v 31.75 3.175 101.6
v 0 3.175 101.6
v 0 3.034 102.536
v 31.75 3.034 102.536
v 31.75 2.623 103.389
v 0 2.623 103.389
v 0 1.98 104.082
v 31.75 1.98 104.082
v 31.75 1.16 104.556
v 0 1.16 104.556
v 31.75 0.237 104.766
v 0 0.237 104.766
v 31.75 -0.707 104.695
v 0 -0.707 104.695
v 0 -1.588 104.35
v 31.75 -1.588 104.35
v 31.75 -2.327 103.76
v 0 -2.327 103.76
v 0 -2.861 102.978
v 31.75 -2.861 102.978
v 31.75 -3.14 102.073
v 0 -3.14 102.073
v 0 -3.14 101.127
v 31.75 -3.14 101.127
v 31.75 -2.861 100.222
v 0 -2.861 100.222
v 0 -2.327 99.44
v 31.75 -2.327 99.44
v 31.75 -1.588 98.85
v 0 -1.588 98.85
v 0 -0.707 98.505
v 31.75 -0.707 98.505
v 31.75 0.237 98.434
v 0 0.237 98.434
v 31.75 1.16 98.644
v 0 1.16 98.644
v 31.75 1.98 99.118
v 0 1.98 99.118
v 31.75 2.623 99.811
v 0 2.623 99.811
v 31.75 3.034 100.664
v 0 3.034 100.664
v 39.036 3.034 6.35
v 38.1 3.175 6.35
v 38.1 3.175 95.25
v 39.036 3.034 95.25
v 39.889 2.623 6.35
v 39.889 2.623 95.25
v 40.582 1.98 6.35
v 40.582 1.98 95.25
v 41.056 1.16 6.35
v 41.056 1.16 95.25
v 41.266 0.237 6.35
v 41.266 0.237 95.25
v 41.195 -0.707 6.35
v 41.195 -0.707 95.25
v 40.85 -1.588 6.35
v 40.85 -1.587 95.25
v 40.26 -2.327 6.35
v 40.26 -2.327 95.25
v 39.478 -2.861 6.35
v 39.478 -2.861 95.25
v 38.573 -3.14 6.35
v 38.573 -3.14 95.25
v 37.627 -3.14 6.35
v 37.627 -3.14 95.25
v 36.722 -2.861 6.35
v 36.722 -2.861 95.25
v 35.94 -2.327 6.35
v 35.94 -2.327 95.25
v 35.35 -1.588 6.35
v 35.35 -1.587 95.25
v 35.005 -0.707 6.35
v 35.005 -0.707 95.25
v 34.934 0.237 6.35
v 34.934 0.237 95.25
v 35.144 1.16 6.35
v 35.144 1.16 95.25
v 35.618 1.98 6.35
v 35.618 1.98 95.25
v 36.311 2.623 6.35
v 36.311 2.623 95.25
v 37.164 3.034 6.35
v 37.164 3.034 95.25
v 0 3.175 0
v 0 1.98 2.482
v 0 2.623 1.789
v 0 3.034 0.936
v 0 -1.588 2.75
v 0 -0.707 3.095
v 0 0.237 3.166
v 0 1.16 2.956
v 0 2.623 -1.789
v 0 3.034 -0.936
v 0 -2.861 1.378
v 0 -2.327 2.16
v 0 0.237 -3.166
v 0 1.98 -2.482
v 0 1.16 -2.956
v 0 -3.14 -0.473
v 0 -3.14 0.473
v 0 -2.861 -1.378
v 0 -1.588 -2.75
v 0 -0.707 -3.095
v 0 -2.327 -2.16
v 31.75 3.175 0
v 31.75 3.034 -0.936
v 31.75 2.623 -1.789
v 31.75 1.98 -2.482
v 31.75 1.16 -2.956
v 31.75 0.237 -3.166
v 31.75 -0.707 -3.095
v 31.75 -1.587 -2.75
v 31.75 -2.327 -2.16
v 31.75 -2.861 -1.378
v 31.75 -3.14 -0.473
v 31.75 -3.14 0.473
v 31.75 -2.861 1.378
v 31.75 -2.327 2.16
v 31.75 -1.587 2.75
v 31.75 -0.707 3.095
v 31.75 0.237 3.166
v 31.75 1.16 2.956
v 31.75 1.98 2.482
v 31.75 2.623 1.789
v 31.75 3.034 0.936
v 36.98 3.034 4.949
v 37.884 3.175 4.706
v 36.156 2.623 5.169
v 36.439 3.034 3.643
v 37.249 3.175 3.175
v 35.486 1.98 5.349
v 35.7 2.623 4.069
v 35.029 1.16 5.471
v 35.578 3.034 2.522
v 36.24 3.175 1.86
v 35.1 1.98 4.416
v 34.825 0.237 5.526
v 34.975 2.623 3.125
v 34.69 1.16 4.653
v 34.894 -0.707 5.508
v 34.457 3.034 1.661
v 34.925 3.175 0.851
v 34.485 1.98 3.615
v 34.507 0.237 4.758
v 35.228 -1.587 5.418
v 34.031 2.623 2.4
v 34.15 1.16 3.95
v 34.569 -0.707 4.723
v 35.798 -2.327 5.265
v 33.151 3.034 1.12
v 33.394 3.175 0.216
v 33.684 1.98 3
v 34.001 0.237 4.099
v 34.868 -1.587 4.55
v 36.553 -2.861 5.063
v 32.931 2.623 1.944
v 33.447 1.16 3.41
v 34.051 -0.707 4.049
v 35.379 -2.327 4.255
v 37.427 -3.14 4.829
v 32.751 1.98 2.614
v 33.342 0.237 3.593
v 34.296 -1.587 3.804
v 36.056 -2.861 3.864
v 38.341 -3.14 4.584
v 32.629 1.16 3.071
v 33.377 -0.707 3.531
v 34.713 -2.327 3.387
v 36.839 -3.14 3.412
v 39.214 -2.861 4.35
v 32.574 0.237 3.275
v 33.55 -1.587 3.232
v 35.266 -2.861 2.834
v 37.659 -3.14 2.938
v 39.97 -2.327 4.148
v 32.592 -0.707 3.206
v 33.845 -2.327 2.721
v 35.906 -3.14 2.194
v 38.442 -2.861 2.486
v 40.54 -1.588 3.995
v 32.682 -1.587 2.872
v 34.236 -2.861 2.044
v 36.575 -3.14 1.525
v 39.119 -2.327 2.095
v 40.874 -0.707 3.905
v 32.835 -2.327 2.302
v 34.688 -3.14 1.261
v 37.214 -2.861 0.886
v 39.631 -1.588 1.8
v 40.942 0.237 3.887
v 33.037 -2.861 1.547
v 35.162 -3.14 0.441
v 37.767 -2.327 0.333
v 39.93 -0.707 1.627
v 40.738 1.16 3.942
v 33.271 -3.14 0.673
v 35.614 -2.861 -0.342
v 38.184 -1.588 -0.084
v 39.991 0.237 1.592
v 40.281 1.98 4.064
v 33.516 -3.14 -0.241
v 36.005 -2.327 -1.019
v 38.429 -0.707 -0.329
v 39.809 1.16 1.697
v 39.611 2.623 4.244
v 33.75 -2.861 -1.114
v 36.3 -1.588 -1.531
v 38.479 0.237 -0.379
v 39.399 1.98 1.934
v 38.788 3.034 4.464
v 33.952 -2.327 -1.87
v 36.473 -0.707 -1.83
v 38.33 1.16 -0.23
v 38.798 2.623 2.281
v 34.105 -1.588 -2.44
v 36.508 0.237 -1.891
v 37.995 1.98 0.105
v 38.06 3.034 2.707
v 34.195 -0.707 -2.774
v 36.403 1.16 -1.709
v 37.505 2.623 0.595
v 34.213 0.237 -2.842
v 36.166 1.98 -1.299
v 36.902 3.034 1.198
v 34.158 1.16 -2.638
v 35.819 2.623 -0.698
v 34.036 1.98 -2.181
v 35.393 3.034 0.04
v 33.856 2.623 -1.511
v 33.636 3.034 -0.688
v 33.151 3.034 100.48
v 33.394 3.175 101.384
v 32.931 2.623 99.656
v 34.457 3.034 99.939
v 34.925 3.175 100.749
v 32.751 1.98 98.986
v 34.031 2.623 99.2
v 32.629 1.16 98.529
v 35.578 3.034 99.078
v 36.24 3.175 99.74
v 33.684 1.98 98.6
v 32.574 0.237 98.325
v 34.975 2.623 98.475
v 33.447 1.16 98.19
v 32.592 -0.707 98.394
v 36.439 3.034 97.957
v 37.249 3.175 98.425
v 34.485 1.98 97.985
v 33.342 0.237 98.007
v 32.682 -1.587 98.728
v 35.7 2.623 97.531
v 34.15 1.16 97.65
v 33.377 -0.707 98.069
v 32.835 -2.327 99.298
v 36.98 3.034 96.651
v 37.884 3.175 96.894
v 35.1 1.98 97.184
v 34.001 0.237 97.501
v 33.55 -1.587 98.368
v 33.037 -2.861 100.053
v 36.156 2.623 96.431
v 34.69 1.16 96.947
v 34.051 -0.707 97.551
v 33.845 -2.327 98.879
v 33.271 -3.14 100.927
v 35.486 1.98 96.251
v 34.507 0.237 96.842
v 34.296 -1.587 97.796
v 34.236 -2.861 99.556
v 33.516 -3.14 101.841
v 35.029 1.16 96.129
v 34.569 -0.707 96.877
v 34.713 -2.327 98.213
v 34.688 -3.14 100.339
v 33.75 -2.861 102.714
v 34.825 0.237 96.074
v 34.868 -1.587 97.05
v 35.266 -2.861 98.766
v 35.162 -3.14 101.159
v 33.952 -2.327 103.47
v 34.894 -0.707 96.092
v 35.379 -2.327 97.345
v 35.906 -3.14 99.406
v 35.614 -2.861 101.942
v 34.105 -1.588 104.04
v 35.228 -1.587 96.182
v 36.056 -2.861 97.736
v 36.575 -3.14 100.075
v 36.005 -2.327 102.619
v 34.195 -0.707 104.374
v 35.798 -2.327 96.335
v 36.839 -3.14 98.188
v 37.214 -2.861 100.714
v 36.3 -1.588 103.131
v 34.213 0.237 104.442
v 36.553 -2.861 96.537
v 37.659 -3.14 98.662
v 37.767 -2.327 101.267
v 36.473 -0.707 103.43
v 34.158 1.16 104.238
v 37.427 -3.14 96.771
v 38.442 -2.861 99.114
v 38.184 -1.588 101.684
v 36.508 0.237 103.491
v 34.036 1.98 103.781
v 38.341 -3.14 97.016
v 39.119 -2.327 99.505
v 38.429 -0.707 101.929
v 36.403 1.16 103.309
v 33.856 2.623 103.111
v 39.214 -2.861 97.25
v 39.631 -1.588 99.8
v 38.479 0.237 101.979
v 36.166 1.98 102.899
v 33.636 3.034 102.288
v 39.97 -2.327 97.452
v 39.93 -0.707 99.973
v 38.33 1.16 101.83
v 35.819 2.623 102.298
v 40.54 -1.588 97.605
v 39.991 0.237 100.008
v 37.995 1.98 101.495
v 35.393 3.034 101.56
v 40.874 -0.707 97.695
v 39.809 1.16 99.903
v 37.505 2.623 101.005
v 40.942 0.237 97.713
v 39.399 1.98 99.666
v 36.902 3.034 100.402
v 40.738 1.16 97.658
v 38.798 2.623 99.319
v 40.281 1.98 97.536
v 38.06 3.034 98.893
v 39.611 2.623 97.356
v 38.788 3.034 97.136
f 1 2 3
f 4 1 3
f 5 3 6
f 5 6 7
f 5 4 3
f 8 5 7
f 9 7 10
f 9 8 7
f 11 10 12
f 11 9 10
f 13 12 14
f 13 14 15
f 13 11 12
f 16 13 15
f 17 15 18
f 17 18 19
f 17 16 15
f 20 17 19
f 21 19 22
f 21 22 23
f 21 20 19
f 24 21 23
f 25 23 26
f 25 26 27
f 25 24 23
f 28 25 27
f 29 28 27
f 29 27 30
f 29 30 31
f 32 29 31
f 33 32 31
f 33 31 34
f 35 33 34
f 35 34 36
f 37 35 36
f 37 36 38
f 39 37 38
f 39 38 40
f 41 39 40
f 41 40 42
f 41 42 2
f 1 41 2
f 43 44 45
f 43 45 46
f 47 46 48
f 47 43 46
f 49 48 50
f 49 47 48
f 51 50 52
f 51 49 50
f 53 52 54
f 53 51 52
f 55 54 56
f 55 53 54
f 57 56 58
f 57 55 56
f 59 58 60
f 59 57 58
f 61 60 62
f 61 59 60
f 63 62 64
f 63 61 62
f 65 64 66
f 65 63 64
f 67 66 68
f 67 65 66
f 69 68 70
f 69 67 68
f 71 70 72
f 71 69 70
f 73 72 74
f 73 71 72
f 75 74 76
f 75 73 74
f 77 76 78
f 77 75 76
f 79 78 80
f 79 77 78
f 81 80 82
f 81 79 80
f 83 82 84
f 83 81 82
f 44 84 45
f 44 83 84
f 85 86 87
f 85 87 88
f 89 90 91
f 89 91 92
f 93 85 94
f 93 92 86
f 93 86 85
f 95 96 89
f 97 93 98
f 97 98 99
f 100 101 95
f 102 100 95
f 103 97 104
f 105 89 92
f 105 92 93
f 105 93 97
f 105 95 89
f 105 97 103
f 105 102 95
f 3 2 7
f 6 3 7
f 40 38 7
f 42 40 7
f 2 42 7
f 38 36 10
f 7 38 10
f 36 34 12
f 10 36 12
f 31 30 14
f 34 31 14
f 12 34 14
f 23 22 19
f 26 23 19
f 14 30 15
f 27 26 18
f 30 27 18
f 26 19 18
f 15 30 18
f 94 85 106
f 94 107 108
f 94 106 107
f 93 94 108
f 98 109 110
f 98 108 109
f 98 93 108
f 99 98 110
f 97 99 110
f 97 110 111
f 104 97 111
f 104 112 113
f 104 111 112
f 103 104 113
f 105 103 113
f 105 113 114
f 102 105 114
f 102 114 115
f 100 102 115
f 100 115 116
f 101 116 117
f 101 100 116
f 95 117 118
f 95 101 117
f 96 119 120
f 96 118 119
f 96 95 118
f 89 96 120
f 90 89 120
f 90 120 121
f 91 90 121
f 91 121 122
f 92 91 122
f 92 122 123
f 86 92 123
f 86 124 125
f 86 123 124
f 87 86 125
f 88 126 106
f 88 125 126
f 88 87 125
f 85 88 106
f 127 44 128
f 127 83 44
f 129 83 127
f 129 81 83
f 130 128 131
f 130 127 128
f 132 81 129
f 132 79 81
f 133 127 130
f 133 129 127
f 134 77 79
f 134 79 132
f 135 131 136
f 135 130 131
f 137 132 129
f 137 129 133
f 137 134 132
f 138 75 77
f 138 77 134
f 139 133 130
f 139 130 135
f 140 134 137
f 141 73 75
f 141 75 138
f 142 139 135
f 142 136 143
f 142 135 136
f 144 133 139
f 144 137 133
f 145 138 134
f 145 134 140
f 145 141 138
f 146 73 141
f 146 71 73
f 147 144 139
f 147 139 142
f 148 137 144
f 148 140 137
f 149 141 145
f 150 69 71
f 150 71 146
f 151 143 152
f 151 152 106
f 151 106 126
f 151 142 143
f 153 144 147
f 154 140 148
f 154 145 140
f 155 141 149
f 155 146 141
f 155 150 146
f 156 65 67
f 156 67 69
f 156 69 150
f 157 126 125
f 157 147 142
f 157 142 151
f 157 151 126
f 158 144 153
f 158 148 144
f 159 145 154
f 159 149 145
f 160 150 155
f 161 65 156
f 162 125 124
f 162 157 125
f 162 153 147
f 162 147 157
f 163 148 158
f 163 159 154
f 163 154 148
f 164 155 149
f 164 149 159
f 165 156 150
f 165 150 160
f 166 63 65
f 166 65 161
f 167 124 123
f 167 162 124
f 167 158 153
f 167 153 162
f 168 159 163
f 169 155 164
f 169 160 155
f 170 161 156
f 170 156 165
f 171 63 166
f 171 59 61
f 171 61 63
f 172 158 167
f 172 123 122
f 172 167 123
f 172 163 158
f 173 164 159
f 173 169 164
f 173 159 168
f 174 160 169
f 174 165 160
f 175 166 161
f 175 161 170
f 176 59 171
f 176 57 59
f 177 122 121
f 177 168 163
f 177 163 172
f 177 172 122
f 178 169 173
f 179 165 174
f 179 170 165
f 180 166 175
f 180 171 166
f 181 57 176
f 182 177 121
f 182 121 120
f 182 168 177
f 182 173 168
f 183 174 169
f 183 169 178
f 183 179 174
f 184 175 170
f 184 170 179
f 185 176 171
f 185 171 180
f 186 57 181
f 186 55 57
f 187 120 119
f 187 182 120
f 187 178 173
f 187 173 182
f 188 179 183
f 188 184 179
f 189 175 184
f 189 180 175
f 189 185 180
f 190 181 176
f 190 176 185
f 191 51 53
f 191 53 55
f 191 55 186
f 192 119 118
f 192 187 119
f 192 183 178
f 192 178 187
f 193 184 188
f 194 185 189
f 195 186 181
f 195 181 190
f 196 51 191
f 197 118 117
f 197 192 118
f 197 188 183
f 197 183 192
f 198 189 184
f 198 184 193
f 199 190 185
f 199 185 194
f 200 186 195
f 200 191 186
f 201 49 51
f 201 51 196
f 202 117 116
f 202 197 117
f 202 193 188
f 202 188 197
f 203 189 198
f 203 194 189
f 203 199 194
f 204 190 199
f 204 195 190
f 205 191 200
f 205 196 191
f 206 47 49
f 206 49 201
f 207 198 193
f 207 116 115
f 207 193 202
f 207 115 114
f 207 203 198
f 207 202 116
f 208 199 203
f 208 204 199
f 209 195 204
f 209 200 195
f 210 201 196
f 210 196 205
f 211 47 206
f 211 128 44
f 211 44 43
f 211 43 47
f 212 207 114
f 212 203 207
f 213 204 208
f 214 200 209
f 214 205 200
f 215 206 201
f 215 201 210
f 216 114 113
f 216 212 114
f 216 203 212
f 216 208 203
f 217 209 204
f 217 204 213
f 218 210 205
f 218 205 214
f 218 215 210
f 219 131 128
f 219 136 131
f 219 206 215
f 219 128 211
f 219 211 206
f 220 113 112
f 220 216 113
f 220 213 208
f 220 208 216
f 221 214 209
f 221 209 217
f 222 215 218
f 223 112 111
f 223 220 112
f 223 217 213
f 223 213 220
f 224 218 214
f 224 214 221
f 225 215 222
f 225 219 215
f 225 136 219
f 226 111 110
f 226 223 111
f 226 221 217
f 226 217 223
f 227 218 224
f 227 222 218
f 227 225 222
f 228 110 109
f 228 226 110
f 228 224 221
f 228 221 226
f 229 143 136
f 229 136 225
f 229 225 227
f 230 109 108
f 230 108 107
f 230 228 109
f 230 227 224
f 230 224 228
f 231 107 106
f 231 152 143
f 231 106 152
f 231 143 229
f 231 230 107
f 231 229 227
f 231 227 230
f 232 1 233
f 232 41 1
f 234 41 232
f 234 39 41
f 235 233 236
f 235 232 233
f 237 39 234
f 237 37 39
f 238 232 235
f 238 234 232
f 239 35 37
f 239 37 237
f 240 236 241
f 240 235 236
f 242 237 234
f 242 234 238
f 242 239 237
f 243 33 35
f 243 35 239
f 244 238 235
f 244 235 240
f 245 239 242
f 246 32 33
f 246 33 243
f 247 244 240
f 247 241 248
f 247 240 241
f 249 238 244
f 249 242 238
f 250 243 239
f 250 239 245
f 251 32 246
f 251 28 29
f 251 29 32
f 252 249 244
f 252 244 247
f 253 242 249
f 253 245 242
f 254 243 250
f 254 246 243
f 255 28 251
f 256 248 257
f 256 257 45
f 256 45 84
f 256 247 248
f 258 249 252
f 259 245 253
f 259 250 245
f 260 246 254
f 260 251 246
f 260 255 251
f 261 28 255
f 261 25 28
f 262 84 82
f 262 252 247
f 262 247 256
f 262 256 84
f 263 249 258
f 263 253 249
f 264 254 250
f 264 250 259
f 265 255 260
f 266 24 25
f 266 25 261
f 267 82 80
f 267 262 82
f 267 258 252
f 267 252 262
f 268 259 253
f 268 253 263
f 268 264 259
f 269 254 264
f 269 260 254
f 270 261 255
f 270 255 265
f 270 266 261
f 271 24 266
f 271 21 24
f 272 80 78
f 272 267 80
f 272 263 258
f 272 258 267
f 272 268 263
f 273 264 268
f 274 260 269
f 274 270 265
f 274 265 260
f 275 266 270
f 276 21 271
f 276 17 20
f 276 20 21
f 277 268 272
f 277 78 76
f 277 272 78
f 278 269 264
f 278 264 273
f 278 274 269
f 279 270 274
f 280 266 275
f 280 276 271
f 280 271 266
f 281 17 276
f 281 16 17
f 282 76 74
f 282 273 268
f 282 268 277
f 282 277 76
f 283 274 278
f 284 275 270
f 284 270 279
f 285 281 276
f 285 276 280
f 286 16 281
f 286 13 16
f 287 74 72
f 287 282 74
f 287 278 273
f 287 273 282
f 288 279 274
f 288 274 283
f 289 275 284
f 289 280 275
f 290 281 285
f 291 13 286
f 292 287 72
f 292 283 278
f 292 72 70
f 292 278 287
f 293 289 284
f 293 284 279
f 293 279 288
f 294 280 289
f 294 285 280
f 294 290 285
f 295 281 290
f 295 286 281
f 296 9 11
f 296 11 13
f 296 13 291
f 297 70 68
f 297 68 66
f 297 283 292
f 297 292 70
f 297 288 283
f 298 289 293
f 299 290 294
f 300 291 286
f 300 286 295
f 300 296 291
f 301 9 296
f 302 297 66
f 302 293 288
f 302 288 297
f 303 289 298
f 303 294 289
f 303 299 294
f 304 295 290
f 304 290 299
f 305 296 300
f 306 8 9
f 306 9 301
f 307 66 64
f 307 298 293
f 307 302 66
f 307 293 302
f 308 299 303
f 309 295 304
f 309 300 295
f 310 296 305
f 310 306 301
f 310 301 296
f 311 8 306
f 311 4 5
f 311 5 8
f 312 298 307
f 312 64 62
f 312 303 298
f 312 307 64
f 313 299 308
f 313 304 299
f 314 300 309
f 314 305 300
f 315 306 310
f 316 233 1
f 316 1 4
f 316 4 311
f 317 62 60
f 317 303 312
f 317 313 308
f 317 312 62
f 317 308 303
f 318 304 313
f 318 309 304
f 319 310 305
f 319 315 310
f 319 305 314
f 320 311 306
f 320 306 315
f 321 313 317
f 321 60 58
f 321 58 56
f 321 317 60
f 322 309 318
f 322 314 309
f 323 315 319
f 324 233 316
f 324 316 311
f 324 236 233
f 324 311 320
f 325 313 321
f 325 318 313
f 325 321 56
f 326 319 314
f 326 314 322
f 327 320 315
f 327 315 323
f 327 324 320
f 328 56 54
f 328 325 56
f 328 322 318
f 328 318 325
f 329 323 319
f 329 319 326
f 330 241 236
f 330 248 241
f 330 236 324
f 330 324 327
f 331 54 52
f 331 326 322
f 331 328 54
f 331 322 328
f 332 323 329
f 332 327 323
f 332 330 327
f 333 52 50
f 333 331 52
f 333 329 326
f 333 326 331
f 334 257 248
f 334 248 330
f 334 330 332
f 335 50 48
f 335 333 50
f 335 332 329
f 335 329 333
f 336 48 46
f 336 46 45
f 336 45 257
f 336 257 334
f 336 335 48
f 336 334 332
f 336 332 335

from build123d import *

# Parameters (mm, degrees)
F1_R = 3.175


with BuildPart() as f2:
    # F2: sweep along a path in F0
    with BuildLine(Plane.XZ) as f2_path:
        Line((0, 101.6), (31.75, 101.6))
        ThreePointArc((31.75, 101.6), (36.240128, 99.740128), (38.1, 95.25))
        Line((38.1, 95.25), (38.1, 6.35))
        ThreePointArc((38.1, 6.35), (36.240128, 1.859872), (31.75, 0))
        Line((31.75, 0), (0, 0))
    # F1 (on Right) → F2 (sweep)
    with BuildSketch(Plane.YZ):
        with Locations((0, 101.6)):
            Circle(F1_R)
    sweep(path=f2_path.line)


solid = f2.part
